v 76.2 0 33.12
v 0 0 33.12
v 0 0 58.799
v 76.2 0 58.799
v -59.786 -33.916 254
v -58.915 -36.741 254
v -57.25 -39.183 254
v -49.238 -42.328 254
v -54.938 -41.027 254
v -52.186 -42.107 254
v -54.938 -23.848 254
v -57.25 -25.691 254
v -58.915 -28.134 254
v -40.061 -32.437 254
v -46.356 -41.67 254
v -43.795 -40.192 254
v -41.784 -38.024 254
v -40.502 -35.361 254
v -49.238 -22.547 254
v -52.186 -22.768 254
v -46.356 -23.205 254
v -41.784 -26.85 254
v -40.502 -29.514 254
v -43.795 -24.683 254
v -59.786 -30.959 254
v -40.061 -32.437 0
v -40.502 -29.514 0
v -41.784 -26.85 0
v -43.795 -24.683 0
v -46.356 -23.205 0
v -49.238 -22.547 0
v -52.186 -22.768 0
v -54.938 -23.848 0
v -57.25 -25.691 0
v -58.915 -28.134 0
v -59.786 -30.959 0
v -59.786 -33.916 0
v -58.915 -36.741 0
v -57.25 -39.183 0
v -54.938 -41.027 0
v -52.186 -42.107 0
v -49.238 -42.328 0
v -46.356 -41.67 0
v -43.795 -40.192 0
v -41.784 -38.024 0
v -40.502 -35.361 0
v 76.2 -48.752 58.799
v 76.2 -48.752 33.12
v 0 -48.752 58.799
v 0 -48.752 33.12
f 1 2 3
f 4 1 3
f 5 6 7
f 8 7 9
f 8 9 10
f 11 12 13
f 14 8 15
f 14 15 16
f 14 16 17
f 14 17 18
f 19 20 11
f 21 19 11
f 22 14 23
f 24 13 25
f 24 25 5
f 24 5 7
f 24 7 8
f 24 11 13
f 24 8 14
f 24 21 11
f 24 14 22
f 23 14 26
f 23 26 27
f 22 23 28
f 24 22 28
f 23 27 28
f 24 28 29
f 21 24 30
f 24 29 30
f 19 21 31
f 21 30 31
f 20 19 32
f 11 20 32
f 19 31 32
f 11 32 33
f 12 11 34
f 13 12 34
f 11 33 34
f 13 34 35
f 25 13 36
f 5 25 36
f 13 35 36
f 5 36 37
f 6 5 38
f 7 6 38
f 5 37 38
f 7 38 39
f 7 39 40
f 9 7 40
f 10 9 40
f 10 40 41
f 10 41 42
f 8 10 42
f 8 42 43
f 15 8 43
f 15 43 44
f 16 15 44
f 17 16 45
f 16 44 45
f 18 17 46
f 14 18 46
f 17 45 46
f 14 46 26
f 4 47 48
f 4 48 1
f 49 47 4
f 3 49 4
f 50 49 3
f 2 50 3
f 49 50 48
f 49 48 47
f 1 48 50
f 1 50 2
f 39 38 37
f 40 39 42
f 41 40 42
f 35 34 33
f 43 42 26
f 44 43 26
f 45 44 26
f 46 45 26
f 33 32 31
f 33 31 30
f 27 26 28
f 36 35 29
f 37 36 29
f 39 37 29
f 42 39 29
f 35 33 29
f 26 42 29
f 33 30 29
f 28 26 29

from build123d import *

# Parameters (mm, degrees)
F0_R     = 9.918183
F1_DEPTH = 254
F2_W     = 48.751809
F2_H     = 25.678962
F3_DEPTH = 76.2


with BuildPart() as f1:
    # F0 (on Top) → F1 (new body)
    with BuildSketch(Plane.XY):
        with Locations((-49.979053, -32.437287)):
            Circle(F0_R)
    extrude(amount=F1_DEPTH)


with BuildPart() as f3:
    # F2 (on Right) → F3 (new body)
    with BuildSketch(Plane.YZ):
        with Locations((-24.375904, 45.959424)):
            Rectangle(F2_W, F2_H)
    extrude(amount=F3_DEPTH)


solid = Compound([f1.part, f3.part])
